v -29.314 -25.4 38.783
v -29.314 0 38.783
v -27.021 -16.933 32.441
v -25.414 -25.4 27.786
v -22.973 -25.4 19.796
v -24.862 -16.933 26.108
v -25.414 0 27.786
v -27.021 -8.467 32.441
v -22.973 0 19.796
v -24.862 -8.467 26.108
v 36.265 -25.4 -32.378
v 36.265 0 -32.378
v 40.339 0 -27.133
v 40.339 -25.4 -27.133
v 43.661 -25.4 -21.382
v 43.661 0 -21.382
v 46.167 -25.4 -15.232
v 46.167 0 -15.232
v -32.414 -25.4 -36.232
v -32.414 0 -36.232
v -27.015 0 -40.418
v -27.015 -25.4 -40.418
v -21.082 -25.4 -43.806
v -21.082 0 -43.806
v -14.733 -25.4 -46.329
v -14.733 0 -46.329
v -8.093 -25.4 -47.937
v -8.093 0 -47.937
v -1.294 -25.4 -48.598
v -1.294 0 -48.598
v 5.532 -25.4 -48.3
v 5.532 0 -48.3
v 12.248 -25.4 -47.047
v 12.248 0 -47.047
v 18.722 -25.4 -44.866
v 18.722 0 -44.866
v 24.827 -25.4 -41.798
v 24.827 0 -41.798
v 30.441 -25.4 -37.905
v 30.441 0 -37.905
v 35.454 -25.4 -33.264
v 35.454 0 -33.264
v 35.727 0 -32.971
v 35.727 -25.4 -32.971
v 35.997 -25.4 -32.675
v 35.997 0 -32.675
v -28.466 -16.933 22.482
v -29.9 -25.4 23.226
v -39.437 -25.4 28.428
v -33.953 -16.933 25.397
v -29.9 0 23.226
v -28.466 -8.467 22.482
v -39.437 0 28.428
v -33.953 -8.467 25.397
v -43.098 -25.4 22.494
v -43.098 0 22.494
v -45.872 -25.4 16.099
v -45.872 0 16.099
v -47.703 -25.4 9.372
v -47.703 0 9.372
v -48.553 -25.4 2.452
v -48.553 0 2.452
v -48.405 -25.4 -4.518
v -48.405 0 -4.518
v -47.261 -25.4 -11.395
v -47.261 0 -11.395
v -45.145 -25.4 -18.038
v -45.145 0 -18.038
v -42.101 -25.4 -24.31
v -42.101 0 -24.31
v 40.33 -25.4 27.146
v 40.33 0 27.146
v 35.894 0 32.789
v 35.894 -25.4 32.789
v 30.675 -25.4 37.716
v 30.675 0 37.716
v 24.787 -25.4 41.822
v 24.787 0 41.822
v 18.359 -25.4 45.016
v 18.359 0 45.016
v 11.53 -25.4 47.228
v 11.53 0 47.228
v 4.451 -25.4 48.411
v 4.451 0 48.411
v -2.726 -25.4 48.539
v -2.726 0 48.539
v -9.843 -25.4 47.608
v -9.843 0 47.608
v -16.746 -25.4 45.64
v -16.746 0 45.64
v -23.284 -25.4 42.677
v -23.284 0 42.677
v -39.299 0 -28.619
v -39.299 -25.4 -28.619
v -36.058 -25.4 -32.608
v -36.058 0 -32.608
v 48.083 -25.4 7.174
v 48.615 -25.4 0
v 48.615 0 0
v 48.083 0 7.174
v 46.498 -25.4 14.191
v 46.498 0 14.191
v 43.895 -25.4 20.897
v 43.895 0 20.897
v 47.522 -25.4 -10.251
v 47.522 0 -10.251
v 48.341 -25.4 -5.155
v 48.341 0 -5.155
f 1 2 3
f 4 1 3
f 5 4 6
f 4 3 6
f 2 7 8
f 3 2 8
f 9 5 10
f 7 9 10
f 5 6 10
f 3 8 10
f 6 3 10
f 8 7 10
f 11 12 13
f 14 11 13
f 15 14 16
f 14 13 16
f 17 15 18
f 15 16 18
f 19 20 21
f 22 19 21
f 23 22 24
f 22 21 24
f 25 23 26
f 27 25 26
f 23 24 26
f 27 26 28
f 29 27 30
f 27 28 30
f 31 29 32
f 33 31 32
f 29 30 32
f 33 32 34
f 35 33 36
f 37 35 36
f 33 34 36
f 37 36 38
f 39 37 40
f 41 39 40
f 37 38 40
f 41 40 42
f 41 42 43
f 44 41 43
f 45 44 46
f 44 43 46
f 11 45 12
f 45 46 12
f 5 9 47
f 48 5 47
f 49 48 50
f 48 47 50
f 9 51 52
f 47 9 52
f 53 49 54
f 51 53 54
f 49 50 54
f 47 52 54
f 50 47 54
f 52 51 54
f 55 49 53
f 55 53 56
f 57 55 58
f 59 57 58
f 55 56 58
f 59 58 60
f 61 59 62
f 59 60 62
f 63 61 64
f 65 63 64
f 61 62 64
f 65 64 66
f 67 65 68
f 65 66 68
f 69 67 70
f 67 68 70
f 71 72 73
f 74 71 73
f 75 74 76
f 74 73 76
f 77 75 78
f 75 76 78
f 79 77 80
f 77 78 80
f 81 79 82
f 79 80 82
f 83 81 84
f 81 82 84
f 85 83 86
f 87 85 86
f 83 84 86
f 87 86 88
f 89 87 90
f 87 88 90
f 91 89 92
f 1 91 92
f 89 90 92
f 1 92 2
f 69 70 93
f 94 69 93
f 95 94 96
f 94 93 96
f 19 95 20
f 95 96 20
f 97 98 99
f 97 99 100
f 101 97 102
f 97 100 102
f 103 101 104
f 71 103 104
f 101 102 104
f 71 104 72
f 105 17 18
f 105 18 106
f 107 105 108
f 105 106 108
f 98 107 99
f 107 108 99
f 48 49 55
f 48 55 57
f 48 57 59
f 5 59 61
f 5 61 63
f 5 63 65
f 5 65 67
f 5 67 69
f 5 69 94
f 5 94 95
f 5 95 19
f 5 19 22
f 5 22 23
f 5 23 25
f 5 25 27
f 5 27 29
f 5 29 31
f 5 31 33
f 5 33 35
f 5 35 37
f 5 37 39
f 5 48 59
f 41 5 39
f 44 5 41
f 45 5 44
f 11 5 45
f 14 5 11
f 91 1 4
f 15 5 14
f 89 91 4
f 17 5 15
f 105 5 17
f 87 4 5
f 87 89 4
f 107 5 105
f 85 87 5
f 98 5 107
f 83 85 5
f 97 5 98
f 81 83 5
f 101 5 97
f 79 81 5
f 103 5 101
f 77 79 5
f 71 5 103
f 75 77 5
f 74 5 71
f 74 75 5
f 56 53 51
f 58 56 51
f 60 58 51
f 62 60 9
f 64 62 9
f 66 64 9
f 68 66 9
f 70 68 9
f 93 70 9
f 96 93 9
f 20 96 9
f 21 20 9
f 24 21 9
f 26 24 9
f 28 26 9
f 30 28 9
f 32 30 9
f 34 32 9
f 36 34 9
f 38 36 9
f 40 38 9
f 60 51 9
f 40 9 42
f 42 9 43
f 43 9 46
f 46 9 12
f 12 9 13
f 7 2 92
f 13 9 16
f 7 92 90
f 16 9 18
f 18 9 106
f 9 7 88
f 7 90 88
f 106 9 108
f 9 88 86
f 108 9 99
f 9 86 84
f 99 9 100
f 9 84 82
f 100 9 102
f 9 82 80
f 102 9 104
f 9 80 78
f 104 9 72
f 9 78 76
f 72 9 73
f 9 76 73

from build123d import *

# Parameters (mm, degrees)
F1_DEPTH = 25.4


with BuildPart() as f1:
    # F0 (on Front) → F1 (new body)
    with BuildSketch(Plane.XZ):
        with BuildLine():
            ThreePointArc((46.1673500078, -15.2324506451), (47.999444804, -7.7139521587), (48.6153448964, 0))
            ThreePointArc((48.6153448964, 0), (46.4980117159, 14.1910769804), (40.3304436459, 27.1460323938))
            add(Edge.make_bspline(
                [(40.3304436459, 27.1460323938), (32.3786976376, 23.0993060038), (24.4227156617, 19.0482632148), (16.5014874139, 16.4513327342)],
                knots=[0, 0, 0, 0, 0.2953409121, 0.2953409121, 0.2953409121, 0.2953409121], degree=3))
            add(Edge.make_bspline(
                [(16.5014873898, 16.4513327474), (15.5953694896, 11.2931775522), (15.5320066906, 3.0058951007), (18.67748395, -6.2871122776), (19.9799499764, -9.4342211392)],
                knots=[0.2963486373, 0.2963486373, 0.2963486373, 0.2963486373, 0.4715656378, 0.5637333, 0.5637333, 0.5637333, 0.5637333], degree=3))
            add(Edge.make_bspline(
                [(46.1673500078, -15.2324506451), (37.3947505843, -12.9712227578), (28.6158550244, -10.7067465721), (19.9799499764, -9.4342211392)],
                knots=[0, 0, 0, 0, 0.282903213, 0.282903213, 0.282903213, 0.282903213], degree=3))
        make_face()
        with BuildLine():
            add(Edge.make_bspline(
                [(40.3304436459, 27.1460323938), (32.3786976376, 23.0993060038), (24.4227156617, 19.0482632148), (16.5014874139, 16.4513327342)],
                knots=[0, 0, 0, 0, 0.2953409121, 0.2953409121, 0.2953409121, 0.2953409121], degree=3))
            ThreePointArc((40.3304436459, 27.1460323938), (33.903902399, 34.84217504), (26.0352353751, 41.056281838))
            add(Edge.make_bspline(
                [(26.0352353751, 41.056281838), (22.0398072792, 33.1200566973), (18.0340259226, 25.1754420421), (16.5014873898, 16.4513327474)],
                knots=[0, 0, 0, 0, 0.2963486373, 0.2963486373, 0.2963486373, 0.2963486373], degree=3))
        make_face()
        with BuildLine():
            ThreePointArc((36.2646535731, -32.3778730095), (42.0981018646, -24.3146371306), (46.1673500078, -15.2324506451))
            add(Edge.make_bspline(
                [(46.1673500078, -15.2324506451), (37.3947505843, -12.9712227578), (28.6158550244, -10.7067465721), (19.9799499764, -9.4342211392)],
                knots=[0, 0, 0, 0, 0.282903213, 0.282903213, 0.282903213, 0.282903213], degree=3))
            add(Edge.make_bspline(
                [(19.9799499764, -9.4342211392), (25.0191791568, -21.6103566301), (33.3249337281, -32.9452793274), (35.454034531, -33.2635415263)],
                knots=[0.5637333, 0.5637333, 0.5637333, 0.5637333, 0.9203291446, 0.9203291446, 0.9203291446, 0.9203291446], degree=3))
            ThreePointArc((35.454034531, -33.2635415263), (35.8620782725, -32.823209797), (36.2646535731, -32.3778730095))
        make_face()
        with BuildLine():
            add(Edge.make_bspline(
                [(26.0352353751, 41.056281838), (22.0398072792, 33.1200566973), (18.0340259226, 25.1754420421), (16.5014873898, 16.4513327474)],
                knots=[0, 0, 0, 0, 0.2963486373, 0.2963486373, 0.2963486373, 0.2963486373], degree=3))
            ThreePointArc((26.0352353751, 41.056281838), (-1.9947078477, 48.5744058121), (-29.3138505417, 38.7833717695))
            add(Edge.make_bspline(
                [(-29.3138505417, 38.7833717695), (-27.000307279, 32.4407823134), (-24.6802191732, 26.0937743503), (-22.973223534, 19.7963497545)],
                knots=[0, 0, 0, 0, 0.2452233004, 0.2452233004, 0.2452233004, 0.2452233004], degree=3))
            add(Edge.make_bspline(
                [(16.5014874139, 16.4513327342), (10.9797013124, 14.6410459723), (-2.2734109483, 11.9838999083), (-15.3520884673, 16.285685391), (-22.973223534, 19.7963497545)],
                knots=[0.2953409121, 0.2953409121, 0.2953409121, 0.2953409121, 0.5012192547, 0.7909956335, 0.7909956335, 0.7909956335, 0.7909956335], degree=3))
        make_face()
        with BuildLine():
            add(Edge.make_bspline(
                [(16.5014873898, 16.4513327474), (15.5953694896, 11.2931775522), (15.5320066906, 3.0058951007), (18.67748395, -6.2871122776), (19.9799499764, -9.4342211392)],
                knots=[0.2963486373, 0.2963486373, 0.2963486373, 0.2963486373, 0.4715656378, 0.5637333, 0.5637333, 0.5637333, 0.5637333], degree=3))
            add(Edge.make_bspline(
                [(16.5014874139, 16.4513327342), (10.9797013124, 14.6410459723), (-2.2734109483, 11.9838999083), (-15.3520884673, 16.285685391), (-22.973223534, 19.7963497545)],
                knots=[0.2953409121, 0.2953409121, 0.2953409121, 0.2953409121, 0.5012192547, 0.7909956335, 0.7909956335, 0.7909956335, 0.7909956335], degree=3))
            add(Edge.make_bspline(
                [(-22.973223534, 19.7963497545), (-21.1636232806, 13.1203976417), (-19.1493739324, 1.2205893586), (-21.7464907751, -10.2913075482), (-23.4240943414, -15.3533007473)],
                knots=[0.2452233004, 0.2452233004, 0.2452233004, 0.2452233004, 0.5051865577, 0.7125051709, 0.7125051709, 0.7125051709, 0.7125051709], degree=3))
            add(Edge.make_bspline(
                [(19.9799499764, -9.4342211392), (13.2080472289, -8.4363618033), (-1.6767781675, -7.5725154611), (-15.7685768428, -12.1133609217), (-23.4240943551, -15.3533007369)],
                knots=[0.282903213, 0.282903213, 0.282903213, 0.282903213, 0.5047436611, 0.776928854, 0.776928854, 0.776928854, 0.776928854], degree=3))
        make_face()
        with BuildLine():
            add(Edge.make_bspline(
                [(19.9799499764, -9.4342211392), (25.0191791568, -21.6103566301), (33.3249337281, -32.9452793274), (35.454034531, -33.2635415263)],
                knots=[0.5637333, 0.5637333, 0.5637333, 0.5637333, 0.9203291446, 0.9203291446, 0.9203291446, 0.9203291446], degree=3))
            add(Edge.make_bspline(
                [(19.9799499764, -9.4342211392), (13.2080472289, -8.4363618033), (-1.6767781675, -7.5725154611), (-15.7685768428, -12.1133609217), (-23.4240943551, -15.3533007369)],
                knots=[0.282903213, 0.282903213, 0.282903213, 0.282903213, 0.5047436611, 0.776928854, 0.776928854, 0.776928854, 0.776928854], degree=3))
            add(Edge.make_bspline(
                [(-23.4240943414, -15.3533007473), (-25.7504766345, -22.3729158592), (-29.0871025112, -29.3050684982), (-32.4143035176, -36.2320947071)],
                knots=[0.7125051709, 0.7125051709, 0.7125051709, 0.7125051709, 1, 1, 1, 1], degree=3))
            ThreePointArc((-32.4143035176, -36.2320947071), (2.1243983043, -48.5689066301), (35.454034531, -33.2635415263))
        make_face()
        with BuildLine():
            add(Edge.make_bspline(
                [(-22.973223534, 19.7963497545), (-21.1636232806, 13.1203976417), (-19.1493739324, 1.2205893586), (-21.7464907751, -10.2913075482), (-23.4240943414, -15.3533007473)],
                knots=[0.2452233004, 0.2452233004, 0.2452233004, 0.2452233004, 0.5051865577, 0.7125051709, 0.7125051709, 0.7125051709, 0.7125051709], degree=3))
            add(Edge.make_bspline(
                [(-22.973223534, 19.7963497545), (-28.4700501333, 22.3284546294), (-33.9538200156, 25.3785378793), (-39.4374864795, 28.4277403178)],
                knots=[0.7909956335, 0.7909956335, 0.7909956335, 0.7909956335, 1, 1, 1, 1], degree=3))
            ThreePointArc((-39.4374864795, 28.4277403178), (-48.5534662677, 2.4520752004), (-42.1008703821, -24.3098431189))
            add(Edge.make_bspline(
                [(-23.4240943551, -15.3533007369), (-29.6982235487, -18.0086144957), (-35.899537129, -21.1597200741), (-42.1008703821, -24.3098431189)],
                knots=[0.776928854, 0.776928854, 0.776928854, 0.776928854, 1, 1, 1, 1], degree=3))
        make_face()
        with BuildLine():
            add(Edge.make_bspline(
                [(-23.4240943414, -15.3533007473), (-25.7504766345, -22.3729158592), (-29.0871025112, -29.3050684982), (-32.4143035176, -36.2320947071)],
                knots=[0.7125051709, 0.7125051709, 0.7125051709, 0.7125051709, 1, 1, 1, 1], degree=3))
            add(Edge.make_bspline(
                [(-23.4240943551, -15.3533007369), (-29.6982235487, -18.0086144957), (-35.899537129, -21.1597200741), (-42.1008703821, -24.3098431189)],
                knots=[0.776928854, 0.776928854, 0.776928854, 0.776928854, 1, 1, 1, 1], degree=3))
            ThreePointArc((-42.1008703821, -24.3098431189), (-37.731456453, -30.6559774487), (-32.4143035176, -36.2320947071))
        make_face()
    extrude(amount=F1_DEPTH)


solid = f1.part
